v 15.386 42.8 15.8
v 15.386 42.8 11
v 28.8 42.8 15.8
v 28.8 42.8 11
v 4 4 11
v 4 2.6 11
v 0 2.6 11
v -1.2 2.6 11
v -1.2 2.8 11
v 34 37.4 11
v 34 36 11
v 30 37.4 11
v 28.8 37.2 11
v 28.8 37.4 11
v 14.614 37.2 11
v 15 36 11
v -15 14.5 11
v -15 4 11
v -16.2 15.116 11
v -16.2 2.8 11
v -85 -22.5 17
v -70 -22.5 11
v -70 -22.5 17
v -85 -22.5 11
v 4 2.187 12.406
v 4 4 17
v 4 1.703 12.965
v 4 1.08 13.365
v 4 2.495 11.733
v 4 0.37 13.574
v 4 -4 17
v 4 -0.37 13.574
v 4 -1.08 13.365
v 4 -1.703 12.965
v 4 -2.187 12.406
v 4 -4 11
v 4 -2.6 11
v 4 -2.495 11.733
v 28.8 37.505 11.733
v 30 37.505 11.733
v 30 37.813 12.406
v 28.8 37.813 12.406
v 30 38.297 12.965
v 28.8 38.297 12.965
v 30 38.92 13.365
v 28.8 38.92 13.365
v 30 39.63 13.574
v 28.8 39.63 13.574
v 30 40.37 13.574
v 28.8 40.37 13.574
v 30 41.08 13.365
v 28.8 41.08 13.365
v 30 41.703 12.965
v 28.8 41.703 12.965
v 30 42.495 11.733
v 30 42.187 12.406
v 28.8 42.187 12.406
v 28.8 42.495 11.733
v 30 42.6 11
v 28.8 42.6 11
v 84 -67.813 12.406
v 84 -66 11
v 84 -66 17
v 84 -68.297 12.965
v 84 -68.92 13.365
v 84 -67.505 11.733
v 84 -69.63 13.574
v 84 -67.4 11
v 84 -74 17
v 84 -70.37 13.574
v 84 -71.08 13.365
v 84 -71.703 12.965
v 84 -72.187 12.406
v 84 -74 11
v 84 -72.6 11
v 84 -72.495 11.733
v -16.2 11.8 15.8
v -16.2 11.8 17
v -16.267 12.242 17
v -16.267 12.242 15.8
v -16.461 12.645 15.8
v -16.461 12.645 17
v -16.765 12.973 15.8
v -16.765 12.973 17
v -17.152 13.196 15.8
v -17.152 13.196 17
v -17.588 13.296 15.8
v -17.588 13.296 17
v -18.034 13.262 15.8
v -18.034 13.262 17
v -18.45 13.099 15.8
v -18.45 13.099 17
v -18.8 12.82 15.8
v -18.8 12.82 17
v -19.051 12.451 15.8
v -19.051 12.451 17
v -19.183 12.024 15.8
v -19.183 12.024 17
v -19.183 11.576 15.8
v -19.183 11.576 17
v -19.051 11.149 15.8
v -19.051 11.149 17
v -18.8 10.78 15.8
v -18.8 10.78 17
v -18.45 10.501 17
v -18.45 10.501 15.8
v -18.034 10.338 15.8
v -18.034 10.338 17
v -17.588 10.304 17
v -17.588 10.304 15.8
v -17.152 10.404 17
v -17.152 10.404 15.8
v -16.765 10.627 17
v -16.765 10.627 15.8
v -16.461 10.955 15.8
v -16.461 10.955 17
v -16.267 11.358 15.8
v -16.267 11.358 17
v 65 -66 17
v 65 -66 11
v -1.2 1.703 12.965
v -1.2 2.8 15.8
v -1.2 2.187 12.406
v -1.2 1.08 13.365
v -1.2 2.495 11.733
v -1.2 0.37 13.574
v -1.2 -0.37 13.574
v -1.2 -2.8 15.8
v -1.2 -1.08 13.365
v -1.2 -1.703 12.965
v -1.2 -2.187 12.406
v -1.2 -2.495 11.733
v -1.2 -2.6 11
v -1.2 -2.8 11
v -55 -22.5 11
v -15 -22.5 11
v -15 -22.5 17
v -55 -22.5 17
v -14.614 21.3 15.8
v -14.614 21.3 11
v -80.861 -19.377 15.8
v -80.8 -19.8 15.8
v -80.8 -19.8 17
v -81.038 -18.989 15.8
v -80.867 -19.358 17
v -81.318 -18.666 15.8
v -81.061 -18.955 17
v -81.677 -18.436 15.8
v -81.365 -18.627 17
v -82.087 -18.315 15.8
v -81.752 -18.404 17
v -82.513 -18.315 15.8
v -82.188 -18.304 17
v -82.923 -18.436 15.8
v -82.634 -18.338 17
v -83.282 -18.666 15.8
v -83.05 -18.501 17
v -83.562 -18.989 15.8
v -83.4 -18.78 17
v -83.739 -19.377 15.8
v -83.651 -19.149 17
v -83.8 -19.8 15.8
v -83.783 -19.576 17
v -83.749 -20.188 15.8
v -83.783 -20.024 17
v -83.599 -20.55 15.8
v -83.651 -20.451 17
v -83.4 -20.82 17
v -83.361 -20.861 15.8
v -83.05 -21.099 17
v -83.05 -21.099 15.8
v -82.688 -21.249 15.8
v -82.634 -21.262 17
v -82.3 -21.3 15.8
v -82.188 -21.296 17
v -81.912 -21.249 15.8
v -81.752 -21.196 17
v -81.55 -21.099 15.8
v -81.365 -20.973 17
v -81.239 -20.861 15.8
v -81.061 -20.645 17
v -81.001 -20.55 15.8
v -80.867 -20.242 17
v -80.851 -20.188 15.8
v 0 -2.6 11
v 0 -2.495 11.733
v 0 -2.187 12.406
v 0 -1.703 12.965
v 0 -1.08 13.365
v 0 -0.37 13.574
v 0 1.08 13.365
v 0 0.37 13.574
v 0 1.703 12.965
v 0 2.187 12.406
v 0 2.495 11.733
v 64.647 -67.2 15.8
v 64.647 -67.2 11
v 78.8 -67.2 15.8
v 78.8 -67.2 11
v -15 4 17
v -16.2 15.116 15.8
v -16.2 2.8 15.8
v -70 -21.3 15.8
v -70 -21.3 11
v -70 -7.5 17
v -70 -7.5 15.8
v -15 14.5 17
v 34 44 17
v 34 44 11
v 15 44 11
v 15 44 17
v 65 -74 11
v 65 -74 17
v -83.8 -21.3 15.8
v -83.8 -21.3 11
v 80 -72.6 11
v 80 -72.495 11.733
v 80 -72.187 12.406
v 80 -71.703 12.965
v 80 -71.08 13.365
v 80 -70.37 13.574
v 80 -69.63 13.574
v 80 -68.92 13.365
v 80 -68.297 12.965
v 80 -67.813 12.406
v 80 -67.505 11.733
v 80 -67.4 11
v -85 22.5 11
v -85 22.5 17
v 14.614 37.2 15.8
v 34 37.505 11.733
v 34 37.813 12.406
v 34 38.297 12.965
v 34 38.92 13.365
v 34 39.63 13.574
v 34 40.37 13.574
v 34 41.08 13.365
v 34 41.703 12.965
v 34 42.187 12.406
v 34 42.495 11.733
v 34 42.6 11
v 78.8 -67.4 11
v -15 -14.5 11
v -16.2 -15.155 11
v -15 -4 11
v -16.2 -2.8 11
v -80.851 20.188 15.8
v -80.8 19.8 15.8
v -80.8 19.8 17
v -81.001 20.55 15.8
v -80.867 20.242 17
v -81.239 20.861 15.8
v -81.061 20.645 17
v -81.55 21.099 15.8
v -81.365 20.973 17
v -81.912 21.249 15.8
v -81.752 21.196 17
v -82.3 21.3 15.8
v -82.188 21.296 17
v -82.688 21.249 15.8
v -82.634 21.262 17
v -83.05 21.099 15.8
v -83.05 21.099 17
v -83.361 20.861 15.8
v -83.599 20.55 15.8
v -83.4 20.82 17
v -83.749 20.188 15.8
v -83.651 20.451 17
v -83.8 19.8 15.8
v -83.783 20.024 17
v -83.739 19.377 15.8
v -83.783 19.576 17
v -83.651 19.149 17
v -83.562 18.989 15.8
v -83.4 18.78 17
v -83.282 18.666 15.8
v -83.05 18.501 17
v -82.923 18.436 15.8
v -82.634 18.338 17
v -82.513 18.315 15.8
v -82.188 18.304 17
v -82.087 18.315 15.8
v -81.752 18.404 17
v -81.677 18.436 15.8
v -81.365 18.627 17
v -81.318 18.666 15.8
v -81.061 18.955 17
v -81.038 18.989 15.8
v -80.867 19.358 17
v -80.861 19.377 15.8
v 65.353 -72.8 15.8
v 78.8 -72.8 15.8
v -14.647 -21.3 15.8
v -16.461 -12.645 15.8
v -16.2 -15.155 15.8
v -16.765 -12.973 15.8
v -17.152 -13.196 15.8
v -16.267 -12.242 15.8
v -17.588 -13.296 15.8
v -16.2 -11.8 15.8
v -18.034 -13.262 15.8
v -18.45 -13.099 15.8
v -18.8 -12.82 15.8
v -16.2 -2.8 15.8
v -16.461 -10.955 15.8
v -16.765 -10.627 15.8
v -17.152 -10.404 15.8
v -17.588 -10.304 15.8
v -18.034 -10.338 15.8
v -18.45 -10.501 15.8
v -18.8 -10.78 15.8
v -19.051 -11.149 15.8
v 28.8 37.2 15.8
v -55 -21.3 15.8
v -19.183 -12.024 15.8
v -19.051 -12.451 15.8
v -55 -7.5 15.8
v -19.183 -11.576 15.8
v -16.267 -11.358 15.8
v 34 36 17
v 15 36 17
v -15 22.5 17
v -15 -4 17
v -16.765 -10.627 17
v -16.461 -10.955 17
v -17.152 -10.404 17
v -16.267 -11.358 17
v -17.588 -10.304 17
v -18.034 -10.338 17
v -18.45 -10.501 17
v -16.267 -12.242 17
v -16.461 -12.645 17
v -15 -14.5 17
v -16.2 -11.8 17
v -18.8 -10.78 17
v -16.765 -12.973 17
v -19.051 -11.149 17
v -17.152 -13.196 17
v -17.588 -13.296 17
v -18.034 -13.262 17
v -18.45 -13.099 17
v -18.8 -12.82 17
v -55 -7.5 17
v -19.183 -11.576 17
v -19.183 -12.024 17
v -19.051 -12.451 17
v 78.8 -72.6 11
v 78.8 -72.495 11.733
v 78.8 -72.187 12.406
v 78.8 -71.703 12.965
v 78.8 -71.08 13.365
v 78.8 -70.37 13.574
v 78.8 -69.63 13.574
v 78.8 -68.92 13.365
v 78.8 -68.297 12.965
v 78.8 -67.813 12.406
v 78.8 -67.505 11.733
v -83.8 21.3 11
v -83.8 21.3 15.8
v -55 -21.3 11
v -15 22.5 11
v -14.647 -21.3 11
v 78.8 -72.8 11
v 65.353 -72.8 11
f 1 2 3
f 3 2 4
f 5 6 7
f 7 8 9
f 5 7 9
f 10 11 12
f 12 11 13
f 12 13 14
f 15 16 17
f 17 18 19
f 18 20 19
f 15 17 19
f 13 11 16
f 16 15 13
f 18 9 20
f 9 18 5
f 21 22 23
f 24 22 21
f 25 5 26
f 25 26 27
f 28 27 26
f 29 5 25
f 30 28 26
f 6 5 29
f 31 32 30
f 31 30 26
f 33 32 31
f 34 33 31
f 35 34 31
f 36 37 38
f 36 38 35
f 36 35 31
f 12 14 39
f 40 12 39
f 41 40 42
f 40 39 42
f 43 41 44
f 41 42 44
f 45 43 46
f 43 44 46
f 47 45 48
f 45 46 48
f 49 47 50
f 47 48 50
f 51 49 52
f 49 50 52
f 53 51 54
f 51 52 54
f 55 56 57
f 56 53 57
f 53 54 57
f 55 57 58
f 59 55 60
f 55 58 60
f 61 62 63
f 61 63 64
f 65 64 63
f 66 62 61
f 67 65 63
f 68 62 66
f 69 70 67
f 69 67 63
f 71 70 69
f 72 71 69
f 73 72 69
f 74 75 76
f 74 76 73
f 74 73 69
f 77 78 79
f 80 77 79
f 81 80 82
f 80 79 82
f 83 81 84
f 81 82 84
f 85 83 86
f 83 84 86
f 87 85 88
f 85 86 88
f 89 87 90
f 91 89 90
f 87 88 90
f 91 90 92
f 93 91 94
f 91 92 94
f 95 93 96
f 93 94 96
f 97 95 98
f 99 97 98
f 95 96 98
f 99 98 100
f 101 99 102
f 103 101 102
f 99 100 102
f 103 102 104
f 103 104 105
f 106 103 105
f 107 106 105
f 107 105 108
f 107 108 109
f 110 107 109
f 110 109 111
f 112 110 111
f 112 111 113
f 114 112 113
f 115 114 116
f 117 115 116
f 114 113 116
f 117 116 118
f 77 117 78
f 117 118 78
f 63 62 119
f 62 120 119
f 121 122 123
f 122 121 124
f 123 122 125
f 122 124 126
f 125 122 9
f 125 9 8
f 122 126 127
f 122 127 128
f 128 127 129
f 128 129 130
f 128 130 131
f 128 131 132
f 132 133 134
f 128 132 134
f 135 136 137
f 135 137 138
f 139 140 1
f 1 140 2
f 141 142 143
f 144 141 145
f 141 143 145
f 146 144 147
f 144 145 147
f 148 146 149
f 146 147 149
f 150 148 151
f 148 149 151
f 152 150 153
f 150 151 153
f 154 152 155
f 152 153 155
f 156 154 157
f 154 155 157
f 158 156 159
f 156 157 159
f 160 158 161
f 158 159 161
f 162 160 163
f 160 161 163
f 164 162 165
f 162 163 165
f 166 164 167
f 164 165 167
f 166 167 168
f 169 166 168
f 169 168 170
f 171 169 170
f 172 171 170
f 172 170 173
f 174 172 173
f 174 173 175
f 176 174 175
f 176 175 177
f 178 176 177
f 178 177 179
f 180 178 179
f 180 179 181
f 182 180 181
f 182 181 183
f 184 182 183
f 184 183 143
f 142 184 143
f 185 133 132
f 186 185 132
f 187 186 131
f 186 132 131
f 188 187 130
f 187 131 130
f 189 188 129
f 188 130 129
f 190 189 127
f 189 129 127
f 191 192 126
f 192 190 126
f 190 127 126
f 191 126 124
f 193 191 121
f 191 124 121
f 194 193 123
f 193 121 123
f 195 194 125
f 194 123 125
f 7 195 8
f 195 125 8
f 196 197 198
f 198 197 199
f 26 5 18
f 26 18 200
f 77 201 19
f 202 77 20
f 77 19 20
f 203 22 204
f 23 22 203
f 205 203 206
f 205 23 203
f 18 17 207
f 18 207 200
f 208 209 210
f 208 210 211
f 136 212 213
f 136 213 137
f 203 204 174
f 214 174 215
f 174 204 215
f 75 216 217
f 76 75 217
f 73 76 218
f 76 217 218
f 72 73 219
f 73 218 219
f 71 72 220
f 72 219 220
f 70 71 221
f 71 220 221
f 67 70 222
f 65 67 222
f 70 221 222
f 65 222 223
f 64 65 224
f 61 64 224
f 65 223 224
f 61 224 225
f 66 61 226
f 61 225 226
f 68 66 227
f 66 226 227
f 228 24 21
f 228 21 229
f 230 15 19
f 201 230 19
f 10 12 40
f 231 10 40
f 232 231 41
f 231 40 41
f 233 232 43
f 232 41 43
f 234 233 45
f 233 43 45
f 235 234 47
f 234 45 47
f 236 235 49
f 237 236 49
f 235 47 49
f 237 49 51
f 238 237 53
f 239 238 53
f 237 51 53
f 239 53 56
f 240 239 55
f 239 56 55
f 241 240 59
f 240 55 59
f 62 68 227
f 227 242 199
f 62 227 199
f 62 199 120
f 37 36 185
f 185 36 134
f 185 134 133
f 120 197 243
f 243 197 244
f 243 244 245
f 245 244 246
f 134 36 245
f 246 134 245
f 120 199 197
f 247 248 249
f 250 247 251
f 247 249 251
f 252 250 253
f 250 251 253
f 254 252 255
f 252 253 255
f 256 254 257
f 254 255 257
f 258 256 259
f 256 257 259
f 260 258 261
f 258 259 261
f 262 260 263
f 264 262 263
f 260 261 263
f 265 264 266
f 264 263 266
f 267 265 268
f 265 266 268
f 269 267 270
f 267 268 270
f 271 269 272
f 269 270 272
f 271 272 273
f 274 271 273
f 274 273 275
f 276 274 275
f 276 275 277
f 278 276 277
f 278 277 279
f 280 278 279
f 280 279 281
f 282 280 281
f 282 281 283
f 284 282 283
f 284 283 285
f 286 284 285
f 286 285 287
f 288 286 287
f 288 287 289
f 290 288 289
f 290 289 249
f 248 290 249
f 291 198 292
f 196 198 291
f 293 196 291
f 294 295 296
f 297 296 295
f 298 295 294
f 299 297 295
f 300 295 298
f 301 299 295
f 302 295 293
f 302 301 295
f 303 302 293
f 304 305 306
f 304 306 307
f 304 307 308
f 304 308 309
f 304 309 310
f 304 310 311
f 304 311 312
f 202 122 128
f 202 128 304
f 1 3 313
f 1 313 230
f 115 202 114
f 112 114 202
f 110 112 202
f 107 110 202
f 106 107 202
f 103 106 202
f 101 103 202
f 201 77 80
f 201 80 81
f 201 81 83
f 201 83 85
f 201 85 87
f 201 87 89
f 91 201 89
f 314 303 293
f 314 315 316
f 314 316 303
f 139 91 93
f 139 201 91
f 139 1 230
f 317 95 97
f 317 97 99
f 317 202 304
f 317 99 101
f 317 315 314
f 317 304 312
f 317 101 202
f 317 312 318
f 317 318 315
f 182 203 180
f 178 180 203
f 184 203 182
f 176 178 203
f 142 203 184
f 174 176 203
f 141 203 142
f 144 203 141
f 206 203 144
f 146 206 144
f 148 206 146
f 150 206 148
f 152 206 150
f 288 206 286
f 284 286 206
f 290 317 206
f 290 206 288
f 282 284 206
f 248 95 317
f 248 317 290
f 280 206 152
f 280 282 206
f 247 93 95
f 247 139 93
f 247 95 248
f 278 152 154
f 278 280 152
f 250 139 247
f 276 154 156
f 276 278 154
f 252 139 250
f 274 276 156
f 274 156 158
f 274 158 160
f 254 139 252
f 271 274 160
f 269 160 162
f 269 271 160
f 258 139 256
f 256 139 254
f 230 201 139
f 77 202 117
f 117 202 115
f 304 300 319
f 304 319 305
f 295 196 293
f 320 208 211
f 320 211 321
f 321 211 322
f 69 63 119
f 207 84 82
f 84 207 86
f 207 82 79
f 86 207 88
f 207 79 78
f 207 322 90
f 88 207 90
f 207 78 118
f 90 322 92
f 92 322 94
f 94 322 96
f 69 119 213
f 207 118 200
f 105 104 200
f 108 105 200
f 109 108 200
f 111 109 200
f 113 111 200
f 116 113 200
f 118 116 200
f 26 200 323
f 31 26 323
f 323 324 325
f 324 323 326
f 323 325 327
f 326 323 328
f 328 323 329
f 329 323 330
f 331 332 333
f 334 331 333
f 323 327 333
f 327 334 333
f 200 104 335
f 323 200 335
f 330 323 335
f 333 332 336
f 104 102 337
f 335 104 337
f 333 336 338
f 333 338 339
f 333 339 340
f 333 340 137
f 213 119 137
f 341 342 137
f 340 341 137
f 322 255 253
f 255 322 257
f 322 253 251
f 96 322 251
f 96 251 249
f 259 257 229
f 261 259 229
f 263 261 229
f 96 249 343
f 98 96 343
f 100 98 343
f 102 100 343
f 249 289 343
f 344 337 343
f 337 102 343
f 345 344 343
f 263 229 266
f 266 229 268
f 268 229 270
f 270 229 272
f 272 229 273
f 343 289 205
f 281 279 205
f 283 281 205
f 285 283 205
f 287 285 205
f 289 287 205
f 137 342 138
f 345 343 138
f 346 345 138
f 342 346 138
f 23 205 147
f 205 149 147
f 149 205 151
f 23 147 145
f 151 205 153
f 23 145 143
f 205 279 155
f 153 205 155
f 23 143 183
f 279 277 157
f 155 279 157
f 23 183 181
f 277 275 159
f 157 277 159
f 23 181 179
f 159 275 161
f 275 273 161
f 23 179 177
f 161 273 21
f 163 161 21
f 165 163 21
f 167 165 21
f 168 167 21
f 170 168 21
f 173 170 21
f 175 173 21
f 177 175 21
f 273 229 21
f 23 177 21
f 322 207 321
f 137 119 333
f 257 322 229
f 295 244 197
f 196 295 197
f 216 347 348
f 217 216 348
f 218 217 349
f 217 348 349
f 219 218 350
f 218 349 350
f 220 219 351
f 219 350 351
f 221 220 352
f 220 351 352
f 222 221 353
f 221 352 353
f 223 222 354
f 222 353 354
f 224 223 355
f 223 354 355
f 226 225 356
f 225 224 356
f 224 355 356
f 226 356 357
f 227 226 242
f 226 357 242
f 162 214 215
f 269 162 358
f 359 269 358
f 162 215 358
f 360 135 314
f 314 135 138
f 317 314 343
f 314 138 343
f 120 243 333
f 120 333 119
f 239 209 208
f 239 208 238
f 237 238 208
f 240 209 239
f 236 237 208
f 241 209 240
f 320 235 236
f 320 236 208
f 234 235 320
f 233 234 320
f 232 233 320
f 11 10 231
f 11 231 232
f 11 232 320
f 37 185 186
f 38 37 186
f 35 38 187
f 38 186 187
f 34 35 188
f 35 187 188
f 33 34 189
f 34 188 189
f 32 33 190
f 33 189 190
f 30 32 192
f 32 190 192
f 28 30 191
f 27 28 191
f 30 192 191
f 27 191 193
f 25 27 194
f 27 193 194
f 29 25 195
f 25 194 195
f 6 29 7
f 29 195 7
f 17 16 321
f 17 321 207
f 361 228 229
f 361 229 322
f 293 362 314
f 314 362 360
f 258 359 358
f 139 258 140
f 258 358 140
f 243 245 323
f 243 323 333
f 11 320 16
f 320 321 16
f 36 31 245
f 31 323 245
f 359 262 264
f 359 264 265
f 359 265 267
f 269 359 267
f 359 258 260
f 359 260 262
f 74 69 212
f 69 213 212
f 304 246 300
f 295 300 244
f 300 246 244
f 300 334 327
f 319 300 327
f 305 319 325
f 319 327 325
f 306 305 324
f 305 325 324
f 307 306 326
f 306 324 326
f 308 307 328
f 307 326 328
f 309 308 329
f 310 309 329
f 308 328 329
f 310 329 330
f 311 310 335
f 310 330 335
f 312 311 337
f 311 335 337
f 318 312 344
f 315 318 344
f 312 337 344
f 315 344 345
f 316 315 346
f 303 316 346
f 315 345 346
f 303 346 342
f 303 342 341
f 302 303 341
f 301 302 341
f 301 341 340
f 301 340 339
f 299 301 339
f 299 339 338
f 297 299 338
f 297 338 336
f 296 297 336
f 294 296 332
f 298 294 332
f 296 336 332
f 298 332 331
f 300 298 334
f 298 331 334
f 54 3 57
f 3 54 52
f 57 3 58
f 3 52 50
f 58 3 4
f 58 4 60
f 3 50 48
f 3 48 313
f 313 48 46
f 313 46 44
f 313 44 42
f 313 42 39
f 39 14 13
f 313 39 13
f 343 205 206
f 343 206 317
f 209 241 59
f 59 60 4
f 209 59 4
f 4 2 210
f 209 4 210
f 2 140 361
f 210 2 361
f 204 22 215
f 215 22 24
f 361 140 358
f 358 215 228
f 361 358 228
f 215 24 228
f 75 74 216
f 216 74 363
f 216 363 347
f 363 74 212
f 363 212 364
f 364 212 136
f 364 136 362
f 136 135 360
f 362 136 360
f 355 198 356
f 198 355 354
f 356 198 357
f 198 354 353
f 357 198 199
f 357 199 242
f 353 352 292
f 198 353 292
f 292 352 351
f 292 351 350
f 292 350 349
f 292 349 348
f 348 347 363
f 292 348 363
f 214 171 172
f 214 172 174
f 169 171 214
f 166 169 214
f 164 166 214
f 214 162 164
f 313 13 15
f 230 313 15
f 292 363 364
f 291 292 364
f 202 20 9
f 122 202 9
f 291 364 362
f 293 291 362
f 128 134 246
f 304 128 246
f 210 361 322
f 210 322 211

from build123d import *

# Parameters (mm, degrees)
PAD001_DEPTH    = 6
THICKNESS001_T  = -1.2
SKETCH011_R     = 1.5
POCKET003_DEPTH = 1.2
SKETCH012_W     = 15
SKETCH012_H     = 15
POCKET004_DEPTH = 6.001
SKETCH013_R     = 2.6
POCKET005_DEPTH = 1.2
SKETCH014_R     = 2.6
POCKET006_DEPTH = 1.2
SKETCH015_R     = 2.6
POCKET007_DEPTH = 1.2
PAD008_DEPTH    = 4
PAD009_DEPTH    = 4
PAD010_DEPTH    = 4


with BuildPart() as part:
    # Sketch004 → Pad001 (new body)
    with BuildSketch(Plane.XY):
        Polygon((80, -74), (65, -74), (-15, -22.5), (-85, -22.5), (-85, 22.5), (-15, 22.5), (15, 44), (30, 44), (30, 36), (15, 36), (-15, 14.5), (-15, 4), (0, 4), (0, -4), (-15, -4), (-15, -14.5), (65, -66), (80, -66), align=None)
    extrude(amount=PAD001_DEPTH)

    # Thickness001
    thickness001_openings = [part.faces().sort_by_distance(p)[0] for p in [
        (-29.840547, -5.671982, 0),
    ]]
    offset(amount=THICKNESS001_T, openings=thickness001_openings, kind=Kind.INTERSECTION)

    # Sketch011 (on Face19 of Thickness001) → Pocket003 (cut)
    with BuildSketch(Plane.XY.offset(6)):
        with Locations((-82.3, 19.8)):
            Circle(SKETCH011_R)
        with Locations((-82.3, -19.8)):
            Circle(SKETCH011_R)
        with Locations((-17.7, 11.8)):
            Circle(SKETCH011_R)
        with Locations((-17.7, -11.8)):
            Circle(SKETCH011_R)
    extrude(amount=-POCKET003_DEPTH, mode=Mode.SUBTRACT)

    # Sketch012 (on Face5 of Pocket003) → Pocket004 (cut, through all)
    with BuildSketch(Plane.XY.offset(6)):
        with Locations((-62.5, -15)):
            Rectangle(SKETCH012_W, SKETCH012_H)
    extrude(amount=-POCKET004_DEPTH, mode=Mode.SUBTRACT)

    # Sketch013 (on Face16 of Pocket004) → Pocket005 (cut)
    with BuildSketch(Plane.YZ.offset(30)):
        with Locations((40, 0)):
            Circle(SKETCH013_R)
    extrude(amount=-POCKET005_DEPTH, mode=Mode.SUBTRACT)

    # Sketch014 (on Face11 of Pocket005) → Pocket006 (cut)
    with BuildSketch(Plane.YZ):
        Circle(SKETCH014_R)
    extrude(amount=-POCKET006_DEPTH, mode=Mode.SUBTRACT)

    # Sketch015 (on Face2 of Pocket006) → Pocket007 (cut)
    with BuildSketch(Plane.YZ.offset(80)):
        with Locations((-70, 0)):
            Circle(SKETCH015_R)
    extrude(amount=-POCKET007_DEPTH, mode=Mode.SUBTRACT)

    # Pocket007 Face2 → Pad008 (add)
    with BuildSketch(Plane(origin=(80, -70, 3.538728), x_dir=(0, -1, 0), z_dir=(1, 0, 0))):
        with BuildLine():
            Line((-2.6, 3.538728), (-4, 3.538728))
            Line((-4, 3.538728), (-4, -2.461272))
            Line((-4, -2.461272), (4, -2.461272))
            Line((4, -2.461272), (4, 3.538728))
            Line((4, 3.538728), (2.6, 3.538728))
            ThreePointArc((2.6, 3.538728), (0, 0.938728), (-2.6, 3.538728))
        make_face()
    extrude(amount=PAD008_DEPTH)

    # Pad008 Face12 → Pad009 (add)
    with BuildSketch(Plane(origin=(0, 0, 3.538728), x_dir=(0, -1, 0), z_dir=(1, 0, 0))):
        with BuildLine():
            Line((-2.6, 3.538728), (-4, 3.538728))
            Line((-4, 3.538728), (-4, -2.461272))
            Line((-4, -2.461272), (4, -2.461272))
            Line((4, -2.461272), (4, 3.538728))
            Line((4, 3.538728), (2.6, 3.538728))
            ThreePointArc((2.6, 3.538728), (0, 0.938728), (-2.6, 3.538728))
        make_face()
    extrude(amount=PAD009_DEPTH)

    # Pad009 Face19 → Pad010 (add)
    with BuildSketch(Plane(origin=(30, 40, 3.538728), x_dir=(0, -1, 0), z_dir=(1, 0, 0))):
        with BuildLine():
            Line((-2.6, 3.538728), (-4, 3.538728))
            Line((-4, 3.538728), (-4, -2.461272))
            Line((-4, -2.461272), (4, -2.461272))
            Line((4, -2.461272), (4, 3.538728))
            Line((4, 3.538728), (2.6, 3.538728))
            ThreePointArc((2.6, 3.538728), (0, 0.938728), (-2.6, 3.538728))
        make_face()
    extrude(amount=PAD010_DEPTH)


with BuildPart() as part_1:
    # Body001 placement: moved
    add(part.part.moved(Location((0, 0, 11))))


solid = part_1.part
